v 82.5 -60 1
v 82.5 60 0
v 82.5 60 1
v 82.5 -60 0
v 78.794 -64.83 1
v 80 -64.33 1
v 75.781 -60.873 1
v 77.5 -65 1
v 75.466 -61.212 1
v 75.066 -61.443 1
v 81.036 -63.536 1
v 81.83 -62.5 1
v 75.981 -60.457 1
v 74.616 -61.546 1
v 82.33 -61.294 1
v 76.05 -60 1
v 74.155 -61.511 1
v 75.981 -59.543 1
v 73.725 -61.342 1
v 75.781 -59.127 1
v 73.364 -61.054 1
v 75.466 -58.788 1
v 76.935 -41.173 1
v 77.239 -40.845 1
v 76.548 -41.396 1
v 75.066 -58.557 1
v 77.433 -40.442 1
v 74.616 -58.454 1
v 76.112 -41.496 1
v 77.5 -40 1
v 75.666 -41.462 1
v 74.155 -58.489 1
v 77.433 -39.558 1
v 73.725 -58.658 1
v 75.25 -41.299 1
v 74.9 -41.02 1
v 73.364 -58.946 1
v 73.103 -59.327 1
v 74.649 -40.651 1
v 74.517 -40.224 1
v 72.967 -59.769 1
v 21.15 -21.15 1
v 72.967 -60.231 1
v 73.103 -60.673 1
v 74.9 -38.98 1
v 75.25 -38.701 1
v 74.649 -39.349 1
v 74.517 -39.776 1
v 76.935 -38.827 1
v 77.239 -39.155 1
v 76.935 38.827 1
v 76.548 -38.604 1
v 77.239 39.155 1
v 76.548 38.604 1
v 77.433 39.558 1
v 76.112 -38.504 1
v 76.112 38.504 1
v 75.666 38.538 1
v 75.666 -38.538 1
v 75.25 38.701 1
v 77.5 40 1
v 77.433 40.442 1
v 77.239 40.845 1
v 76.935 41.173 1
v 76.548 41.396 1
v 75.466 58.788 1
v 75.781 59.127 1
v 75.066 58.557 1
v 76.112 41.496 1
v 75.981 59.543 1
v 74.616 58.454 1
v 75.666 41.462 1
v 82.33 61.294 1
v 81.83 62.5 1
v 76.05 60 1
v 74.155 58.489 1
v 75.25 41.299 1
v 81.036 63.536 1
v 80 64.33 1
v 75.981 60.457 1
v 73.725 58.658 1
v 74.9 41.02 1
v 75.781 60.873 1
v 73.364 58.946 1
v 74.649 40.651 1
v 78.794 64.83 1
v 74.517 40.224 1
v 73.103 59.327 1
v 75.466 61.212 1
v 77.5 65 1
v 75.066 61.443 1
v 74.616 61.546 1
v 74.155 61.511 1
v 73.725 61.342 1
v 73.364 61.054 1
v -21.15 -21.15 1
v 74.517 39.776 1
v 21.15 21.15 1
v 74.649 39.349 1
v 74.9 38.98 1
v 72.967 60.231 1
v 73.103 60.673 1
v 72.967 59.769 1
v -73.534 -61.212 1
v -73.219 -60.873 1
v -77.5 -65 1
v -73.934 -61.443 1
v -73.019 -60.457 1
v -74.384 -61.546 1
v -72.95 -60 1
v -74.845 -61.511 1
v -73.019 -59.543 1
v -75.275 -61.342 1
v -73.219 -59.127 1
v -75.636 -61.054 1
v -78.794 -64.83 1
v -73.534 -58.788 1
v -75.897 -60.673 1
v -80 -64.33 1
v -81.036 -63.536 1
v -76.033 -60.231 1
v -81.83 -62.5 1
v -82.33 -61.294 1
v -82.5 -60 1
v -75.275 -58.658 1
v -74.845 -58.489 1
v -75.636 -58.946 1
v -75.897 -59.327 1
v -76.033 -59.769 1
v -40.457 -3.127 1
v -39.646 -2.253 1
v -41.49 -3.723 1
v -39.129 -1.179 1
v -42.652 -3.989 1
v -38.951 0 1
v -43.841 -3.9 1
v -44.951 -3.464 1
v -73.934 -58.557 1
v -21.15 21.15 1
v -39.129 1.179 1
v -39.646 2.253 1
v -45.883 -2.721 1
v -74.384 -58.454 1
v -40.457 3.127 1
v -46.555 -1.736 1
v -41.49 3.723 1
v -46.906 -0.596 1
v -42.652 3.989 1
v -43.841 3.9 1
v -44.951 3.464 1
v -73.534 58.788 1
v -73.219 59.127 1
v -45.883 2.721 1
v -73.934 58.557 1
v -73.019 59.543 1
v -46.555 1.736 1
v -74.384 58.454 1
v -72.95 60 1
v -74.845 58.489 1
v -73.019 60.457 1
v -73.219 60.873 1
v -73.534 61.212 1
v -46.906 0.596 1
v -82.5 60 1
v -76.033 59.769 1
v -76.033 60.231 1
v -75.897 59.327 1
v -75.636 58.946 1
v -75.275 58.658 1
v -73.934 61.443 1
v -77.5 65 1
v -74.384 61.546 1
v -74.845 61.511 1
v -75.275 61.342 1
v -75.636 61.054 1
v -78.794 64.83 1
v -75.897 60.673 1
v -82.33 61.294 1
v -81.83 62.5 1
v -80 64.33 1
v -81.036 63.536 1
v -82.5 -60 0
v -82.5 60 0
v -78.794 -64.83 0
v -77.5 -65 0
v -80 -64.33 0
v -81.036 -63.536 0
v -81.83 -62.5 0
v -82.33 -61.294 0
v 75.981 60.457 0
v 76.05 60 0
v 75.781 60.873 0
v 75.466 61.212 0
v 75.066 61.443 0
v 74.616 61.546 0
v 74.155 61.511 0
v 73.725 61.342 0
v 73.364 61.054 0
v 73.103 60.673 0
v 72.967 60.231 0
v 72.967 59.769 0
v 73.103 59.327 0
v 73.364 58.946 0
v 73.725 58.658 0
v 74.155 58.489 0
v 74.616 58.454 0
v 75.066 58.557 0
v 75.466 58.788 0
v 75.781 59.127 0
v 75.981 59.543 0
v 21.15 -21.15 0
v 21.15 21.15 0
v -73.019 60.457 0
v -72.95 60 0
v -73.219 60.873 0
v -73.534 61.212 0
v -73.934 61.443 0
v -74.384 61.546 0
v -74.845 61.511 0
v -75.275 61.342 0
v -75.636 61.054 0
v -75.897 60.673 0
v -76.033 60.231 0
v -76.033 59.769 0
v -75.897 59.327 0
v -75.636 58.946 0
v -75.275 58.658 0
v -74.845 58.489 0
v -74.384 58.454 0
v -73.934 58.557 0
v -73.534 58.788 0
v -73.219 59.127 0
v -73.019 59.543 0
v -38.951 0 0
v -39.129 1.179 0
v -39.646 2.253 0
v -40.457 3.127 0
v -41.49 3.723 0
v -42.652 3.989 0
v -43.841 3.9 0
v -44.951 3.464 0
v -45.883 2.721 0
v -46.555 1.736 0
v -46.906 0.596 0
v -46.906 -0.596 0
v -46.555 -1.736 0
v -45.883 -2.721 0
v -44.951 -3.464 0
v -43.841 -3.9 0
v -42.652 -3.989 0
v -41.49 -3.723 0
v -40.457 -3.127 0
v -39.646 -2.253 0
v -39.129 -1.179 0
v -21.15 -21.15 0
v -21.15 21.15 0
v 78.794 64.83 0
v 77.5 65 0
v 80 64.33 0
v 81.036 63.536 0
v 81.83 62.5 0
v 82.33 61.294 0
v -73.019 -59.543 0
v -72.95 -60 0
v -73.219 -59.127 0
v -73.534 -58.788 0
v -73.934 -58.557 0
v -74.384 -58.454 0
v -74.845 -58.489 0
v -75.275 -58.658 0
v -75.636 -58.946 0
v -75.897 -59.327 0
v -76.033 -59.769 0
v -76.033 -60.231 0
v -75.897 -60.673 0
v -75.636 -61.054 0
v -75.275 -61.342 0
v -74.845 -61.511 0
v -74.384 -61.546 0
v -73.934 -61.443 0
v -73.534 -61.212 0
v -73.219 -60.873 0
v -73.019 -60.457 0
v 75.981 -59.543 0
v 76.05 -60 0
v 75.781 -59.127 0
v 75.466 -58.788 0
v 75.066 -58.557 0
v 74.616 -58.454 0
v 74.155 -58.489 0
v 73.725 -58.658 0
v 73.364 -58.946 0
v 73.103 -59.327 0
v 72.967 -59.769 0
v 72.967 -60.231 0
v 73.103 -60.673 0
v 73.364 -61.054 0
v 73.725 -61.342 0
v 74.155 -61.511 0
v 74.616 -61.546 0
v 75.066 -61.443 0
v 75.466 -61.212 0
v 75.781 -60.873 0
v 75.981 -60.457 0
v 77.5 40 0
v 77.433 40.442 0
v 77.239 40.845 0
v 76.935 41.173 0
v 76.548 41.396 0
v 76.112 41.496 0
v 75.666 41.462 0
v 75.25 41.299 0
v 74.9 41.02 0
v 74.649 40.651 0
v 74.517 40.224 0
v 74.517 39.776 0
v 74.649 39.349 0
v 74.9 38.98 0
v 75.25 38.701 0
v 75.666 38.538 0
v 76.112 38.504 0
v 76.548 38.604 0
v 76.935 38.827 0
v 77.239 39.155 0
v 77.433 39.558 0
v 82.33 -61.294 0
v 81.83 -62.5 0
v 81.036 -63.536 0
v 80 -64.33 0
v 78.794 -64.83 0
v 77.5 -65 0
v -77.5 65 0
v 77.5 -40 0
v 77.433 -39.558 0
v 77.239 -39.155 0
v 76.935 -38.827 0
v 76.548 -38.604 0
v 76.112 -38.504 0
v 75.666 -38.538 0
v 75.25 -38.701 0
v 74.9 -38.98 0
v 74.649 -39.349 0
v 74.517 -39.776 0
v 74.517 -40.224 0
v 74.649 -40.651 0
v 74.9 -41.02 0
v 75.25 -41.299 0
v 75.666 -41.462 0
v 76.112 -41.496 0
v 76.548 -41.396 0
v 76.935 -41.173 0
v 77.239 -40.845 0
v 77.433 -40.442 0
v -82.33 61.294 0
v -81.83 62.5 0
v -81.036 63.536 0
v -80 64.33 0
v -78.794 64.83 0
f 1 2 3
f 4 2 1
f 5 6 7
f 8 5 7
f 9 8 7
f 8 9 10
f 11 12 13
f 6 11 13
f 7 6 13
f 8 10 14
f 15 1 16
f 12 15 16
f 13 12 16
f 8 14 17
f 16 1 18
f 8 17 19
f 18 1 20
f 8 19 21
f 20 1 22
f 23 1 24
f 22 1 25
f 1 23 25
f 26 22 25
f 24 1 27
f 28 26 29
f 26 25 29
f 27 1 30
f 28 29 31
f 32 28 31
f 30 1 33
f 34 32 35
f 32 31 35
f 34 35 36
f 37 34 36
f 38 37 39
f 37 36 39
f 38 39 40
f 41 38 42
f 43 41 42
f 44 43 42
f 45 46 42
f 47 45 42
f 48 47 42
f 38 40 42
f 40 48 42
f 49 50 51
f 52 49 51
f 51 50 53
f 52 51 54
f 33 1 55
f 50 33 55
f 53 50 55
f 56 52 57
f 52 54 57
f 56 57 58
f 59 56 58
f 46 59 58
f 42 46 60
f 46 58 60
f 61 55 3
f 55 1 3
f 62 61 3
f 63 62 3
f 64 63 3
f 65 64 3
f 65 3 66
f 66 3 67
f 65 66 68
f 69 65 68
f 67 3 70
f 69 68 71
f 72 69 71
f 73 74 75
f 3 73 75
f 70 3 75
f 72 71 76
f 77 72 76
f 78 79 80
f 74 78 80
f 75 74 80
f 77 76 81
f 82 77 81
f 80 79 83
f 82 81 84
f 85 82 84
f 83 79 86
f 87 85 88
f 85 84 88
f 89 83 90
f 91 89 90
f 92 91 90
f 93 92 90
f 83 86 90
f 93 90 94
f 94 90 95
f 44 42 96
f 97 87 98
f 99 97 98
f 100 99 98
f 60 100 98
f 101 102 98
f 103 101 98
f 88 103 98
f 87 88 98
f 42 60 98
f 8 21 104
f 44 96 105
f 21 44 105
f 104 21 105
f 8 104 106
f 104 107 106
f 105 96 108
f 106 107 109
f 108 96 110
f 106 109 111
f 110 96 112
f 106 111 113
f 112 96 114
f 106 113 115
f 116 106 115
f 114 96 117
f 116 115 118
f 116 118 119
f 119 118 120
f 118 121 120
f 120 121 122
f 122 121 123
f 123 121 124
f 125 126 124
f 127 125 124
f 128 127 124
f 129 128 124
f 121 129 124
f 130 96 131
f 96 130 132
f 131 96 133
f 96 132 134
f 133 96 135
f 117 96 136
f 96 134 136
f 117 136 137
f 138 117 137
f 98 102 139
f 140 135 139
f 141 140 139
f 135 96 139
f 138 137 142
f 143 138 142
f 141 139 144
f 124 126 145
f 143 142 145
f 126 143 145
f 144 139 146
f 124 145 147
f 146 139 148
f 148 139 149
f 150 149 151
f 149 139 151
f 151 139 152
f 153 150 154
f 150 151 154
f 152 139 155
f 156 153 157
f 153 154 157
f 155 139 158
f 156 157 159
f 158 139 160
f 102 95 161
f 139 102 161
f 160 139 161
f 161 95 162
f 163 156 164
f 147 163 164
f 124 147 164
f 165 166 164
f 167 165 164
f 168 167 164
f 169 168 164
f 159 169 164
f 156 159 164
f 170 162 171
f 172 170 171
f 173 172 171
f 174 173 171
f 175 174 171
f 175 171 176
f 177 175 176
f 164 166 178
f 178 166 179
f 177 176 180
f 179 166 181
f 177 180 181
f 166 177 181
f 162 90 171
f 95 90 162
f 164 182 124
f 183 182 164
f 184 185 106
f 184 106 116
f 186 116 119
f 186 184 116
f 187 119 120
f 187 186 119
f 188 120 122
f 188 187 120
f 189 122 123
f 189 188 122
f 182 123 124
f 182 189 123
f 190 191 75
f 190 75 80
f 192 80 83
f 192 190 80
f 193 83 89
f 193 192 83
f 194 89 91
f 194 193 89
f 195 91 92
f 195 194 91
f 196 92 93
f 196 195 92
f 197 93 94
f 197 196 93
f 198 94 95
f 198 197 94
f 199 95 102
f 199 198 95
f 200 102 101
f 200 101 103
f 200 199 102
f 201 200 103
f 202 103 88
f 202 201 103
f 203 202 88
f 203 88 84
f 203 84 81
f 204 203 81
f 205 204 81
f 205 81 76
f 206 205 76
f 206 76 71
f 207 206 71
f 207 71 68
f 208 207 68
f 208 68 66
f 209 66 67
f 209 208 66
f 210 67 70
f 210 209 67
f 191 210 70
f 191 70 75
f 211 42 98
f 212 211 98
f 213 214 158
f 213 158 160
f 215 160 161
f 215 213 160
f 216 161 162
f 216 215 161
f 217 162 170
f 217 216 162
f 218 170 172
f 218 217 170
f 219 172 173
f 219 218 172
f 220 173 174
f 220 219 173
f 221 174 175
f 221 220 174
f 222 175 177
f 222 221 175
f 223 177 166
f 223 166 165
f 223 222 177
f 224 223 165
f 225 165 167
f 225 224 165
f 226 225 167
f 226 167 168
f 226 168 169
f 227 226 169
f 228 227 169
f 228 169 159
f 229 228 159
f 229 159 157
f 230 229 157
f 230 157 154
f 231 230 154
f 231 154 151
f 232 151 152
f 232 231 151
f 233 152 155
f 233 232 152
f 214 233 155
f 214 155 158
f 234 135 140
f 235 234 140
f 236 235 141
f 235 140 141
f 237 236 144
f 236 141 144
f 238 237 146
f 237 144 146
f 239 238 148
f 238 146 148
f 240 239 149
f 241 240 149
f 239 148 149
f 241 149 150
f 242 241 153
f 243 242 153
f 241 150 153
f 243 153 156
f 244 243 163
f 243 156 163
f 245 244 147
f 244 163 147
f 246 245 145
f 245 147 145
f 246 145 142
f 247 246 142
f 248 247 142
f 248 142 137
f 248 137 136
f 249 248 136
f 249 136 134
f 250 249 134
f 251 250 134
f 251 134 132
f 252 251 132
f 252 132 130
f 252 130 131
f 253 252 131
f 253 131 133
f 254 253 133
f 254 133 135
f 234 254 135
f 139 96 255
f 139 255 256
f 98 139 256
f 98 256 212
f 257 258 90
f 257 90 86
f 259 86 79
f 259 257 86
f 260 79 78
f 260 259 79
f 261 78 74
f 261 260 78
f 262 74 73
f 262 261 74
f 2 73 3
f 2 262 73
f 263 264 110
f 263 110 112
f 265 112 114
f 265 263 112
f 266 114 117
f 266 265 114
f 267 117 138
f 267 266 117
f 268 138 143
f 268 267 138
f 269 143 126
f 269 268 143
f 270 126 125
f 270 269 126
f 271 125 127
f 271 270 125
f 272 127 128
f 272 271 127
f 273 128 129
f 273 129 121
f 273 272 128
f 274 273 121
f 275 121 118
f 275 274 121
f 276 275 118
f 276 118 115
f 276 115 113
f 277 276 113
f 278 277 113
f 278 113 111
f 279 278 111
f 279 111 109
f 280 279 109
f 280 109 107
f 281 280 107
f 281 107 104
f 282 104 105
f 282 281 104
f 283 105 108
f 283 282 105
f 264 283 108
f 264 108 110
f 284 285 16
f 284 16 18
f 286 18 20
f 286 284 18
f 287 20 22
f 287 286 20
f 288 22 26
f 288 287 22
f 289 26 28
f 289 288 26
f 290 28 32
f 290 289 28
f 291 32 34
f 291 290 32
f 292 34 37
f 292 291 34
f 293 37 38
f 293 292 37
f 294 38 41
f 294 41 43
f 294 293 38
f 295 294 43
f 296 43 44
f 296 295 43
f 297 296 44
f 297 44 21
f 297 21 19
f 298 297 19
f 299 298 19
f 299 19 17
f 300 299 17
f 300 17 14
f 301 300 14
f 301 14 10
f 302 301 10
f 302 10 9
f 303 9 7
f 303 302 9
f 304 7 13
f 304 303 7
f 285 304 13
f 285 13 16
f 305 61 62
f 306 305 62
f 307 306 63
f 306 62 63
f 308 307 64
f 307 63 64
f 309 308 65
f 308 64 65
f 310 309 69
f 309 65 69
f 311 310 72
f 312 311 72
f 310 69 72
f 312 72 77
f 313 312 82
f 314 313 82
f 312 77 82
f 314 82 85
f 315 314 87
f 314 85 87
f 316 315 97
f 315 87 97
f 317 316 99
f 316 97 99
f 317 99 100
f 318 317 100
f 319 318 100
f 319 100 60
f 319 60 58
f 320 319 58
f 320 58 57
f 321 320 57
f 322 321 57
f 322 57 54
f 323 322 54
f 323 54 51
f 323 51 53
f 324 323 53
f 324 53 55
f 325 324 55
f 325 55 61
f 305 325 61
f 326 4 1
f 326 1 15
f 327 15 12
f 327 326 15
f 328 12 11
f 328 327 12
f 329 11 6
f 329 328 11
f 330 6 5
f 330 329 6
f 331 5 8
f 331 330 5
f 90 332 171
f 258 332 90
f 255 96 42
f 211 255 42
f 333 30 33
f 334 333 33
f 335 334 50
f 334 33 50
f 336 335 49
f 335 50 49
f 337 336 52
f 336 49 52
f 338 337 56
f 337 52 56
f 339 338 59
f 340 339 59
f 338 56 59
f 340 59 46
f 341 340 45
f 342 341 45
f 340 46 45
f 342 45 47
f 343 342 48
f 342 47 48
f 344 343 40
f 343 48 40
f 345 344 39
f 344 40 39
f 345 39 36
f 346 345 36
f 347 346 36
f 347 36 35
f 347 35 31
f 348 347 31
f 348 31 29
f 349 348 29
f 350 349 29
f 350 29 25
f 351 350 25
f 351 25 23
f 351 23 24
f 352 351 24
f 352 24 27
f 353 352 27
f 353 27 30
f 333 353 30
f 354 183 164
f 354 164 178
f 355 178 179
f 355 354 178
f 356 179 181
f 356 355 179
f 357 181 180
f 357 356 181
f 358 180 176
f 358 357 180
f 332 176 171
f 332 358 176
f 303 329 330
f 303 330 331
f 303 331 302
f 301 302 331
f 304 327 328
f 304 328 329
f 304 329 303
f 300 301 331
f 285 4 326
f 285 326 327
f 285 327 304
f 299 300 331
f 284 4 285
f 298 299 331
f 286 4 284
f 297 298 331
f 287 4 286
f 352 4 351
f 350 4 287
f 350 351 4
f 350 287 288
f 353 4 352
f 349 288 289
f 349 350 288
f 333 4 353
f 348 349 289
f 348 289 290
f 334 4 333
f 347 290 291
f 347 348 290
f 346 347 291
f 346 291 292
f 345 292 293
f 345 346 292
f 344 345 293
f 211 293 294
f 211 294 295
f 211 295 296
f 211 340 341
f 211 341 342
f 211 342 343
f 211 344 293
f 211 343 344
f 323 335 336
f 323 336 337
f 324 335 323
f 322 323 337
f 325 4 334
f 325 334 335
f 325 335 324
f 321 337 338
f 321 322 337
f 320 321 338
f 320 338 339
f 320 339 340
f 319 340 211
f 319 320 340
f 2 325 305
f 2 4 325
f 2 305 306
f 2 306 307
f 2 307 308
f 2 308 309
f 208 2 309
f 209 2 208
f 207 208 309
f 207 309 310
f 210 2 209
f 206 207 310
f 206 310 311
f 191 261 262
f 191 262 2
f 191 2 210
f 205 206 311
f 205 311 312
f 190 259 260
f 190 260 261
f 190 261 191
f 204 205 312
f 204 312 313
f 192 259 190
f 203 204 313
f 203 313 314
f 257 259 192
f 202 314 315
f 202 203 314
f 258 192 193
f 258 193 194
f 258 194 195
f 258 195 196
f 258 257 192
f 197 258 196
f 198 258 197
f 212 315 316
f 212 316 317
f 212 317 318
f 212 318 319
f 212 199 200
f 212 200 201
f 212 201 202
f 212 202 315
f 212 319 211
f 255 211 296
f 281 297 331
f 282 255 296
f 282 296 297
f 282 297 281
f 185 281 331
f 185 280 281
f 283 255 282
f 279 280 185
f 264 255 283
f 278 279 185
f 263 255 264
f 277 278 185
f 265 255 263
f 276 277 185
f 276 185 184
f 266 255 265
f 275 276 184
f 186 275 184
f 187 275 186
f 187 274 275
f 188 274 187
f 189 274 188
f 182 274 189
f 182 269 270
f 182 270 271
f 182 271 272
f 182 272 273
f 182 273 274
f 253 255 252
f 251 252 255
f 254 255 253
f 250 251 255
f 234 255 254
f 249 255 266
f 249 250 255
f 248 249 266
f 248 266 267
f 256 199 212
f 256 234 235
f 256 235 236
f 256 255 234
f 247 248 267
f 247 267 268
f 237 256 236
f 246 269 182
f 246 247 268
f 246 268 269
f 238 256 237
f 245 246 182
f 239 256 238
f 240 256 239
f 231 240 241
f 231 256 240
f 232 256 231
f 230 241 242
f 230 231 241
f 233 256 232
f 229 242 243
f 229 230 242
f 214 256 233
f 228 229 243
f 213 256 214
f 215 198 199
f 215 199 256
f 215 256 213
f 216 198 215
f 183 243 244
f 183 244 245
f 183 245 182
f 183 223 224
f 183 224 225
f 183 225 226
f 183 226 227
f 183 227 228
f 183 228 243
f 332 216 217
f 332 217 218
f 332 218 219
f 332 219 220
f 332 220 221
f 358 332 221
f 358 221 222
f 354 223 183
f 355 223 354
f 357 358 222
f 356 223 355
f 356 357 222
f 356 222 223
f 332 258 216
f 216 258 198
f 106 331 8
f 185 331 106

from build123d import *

# Parameters (mm, degrees)
SKETCH_1_R          = 1.55
EXTRUDE_1_DEPTH     = 1
SKETCH_3_R          = 1.5
CUT_EXTRUDE_2_DEPTH = 10
SKETCH_4_R          = 4
CUT_EXTRUDE_3_DEPTH = 10
SKETCH_5_W          = 42.3
SKETCH_5_H          = 42.3
CUT_EXTRUDE_4_DEPTH = 10


with BuildPart() as part:
    # 草图1 → 凸台-拉伸1 (new body)
    with BuildSketch(Plane.XY):
        with BuildLine():
            Line((-77.5, 65), (77.5, 65))
            ThreePointArc((77.5, 65), (81.035533906, 63.535533906), (82.5, 60))
            Line((82.5, 60), (82.5, -60))
            ThreePointArc((82.5, -60), (81.035533906, -63.535533906), (77.5, -65))
            Line((77.5, -65), (-77.5, -65))
            ThreePointArc((-77.5, -65), (-81.035533906, -63.535533906), (-82.5, -60))
            Line((-82.5, -60), (-82.5, 60))
            ThreePointArc((-82.5, 60), (-81.035533906, 63.535533906), (-77.5, 65))
        make_face()
        with Locations((-74.5, 60)):
            Circle(SKETCH_1_R, mode=Mode.SUBTRACT)
        with Locations((74.5, 60)):
            Circle(SKETCH_1_R, mode=Mode.SUBTRACT)
        with Locations((74.5, -60)):
            Circle(SKETCH_1_R, mode=Mode.SUBTRACT)
        with Locations((-74.5, -60)):
            Circle(SKETCH_1_R, mode=Mode.SUBTRACT)
    extrude(amount=EXTRUDE_1_DEPTH)

    # 草图3 → 切除-拉伸2 (cut)
    with BuildSketch(Plane.XY.offset(1)):
        with Locations((76, 40)):
            Circle(SKETCH_3_R)
        with Locations((76, -40)):
            Circle(SKETCH_3_R)
    extrude(amount=-CUT_EXTRUDE_2_DEPTH, mode=Mode.SUBTRACT)

    # 草图4 → 切除-拉伸3 (cut)
    with BuildSketch(Plane.XY.offset(1)):
        with Locations((-42.951152845, 0)):
            Circle(SKETCH_4_R)
    extrude(amount=-CUT_EXTRUDE_3_DEPTH, mode=Mode.SUBTRACT)

    # 草图5 → 切除-拉伸4 (cut)
    with BuildSketch(Plane.XY.offset(1)):
        Rectangle(SKETCH_5_W, SKETCH_5_H)
    extrude(amount=-CUT_EXTRUDE_4_DEPTH, mode=Mode.SUBTRACT)


solid = part.part
